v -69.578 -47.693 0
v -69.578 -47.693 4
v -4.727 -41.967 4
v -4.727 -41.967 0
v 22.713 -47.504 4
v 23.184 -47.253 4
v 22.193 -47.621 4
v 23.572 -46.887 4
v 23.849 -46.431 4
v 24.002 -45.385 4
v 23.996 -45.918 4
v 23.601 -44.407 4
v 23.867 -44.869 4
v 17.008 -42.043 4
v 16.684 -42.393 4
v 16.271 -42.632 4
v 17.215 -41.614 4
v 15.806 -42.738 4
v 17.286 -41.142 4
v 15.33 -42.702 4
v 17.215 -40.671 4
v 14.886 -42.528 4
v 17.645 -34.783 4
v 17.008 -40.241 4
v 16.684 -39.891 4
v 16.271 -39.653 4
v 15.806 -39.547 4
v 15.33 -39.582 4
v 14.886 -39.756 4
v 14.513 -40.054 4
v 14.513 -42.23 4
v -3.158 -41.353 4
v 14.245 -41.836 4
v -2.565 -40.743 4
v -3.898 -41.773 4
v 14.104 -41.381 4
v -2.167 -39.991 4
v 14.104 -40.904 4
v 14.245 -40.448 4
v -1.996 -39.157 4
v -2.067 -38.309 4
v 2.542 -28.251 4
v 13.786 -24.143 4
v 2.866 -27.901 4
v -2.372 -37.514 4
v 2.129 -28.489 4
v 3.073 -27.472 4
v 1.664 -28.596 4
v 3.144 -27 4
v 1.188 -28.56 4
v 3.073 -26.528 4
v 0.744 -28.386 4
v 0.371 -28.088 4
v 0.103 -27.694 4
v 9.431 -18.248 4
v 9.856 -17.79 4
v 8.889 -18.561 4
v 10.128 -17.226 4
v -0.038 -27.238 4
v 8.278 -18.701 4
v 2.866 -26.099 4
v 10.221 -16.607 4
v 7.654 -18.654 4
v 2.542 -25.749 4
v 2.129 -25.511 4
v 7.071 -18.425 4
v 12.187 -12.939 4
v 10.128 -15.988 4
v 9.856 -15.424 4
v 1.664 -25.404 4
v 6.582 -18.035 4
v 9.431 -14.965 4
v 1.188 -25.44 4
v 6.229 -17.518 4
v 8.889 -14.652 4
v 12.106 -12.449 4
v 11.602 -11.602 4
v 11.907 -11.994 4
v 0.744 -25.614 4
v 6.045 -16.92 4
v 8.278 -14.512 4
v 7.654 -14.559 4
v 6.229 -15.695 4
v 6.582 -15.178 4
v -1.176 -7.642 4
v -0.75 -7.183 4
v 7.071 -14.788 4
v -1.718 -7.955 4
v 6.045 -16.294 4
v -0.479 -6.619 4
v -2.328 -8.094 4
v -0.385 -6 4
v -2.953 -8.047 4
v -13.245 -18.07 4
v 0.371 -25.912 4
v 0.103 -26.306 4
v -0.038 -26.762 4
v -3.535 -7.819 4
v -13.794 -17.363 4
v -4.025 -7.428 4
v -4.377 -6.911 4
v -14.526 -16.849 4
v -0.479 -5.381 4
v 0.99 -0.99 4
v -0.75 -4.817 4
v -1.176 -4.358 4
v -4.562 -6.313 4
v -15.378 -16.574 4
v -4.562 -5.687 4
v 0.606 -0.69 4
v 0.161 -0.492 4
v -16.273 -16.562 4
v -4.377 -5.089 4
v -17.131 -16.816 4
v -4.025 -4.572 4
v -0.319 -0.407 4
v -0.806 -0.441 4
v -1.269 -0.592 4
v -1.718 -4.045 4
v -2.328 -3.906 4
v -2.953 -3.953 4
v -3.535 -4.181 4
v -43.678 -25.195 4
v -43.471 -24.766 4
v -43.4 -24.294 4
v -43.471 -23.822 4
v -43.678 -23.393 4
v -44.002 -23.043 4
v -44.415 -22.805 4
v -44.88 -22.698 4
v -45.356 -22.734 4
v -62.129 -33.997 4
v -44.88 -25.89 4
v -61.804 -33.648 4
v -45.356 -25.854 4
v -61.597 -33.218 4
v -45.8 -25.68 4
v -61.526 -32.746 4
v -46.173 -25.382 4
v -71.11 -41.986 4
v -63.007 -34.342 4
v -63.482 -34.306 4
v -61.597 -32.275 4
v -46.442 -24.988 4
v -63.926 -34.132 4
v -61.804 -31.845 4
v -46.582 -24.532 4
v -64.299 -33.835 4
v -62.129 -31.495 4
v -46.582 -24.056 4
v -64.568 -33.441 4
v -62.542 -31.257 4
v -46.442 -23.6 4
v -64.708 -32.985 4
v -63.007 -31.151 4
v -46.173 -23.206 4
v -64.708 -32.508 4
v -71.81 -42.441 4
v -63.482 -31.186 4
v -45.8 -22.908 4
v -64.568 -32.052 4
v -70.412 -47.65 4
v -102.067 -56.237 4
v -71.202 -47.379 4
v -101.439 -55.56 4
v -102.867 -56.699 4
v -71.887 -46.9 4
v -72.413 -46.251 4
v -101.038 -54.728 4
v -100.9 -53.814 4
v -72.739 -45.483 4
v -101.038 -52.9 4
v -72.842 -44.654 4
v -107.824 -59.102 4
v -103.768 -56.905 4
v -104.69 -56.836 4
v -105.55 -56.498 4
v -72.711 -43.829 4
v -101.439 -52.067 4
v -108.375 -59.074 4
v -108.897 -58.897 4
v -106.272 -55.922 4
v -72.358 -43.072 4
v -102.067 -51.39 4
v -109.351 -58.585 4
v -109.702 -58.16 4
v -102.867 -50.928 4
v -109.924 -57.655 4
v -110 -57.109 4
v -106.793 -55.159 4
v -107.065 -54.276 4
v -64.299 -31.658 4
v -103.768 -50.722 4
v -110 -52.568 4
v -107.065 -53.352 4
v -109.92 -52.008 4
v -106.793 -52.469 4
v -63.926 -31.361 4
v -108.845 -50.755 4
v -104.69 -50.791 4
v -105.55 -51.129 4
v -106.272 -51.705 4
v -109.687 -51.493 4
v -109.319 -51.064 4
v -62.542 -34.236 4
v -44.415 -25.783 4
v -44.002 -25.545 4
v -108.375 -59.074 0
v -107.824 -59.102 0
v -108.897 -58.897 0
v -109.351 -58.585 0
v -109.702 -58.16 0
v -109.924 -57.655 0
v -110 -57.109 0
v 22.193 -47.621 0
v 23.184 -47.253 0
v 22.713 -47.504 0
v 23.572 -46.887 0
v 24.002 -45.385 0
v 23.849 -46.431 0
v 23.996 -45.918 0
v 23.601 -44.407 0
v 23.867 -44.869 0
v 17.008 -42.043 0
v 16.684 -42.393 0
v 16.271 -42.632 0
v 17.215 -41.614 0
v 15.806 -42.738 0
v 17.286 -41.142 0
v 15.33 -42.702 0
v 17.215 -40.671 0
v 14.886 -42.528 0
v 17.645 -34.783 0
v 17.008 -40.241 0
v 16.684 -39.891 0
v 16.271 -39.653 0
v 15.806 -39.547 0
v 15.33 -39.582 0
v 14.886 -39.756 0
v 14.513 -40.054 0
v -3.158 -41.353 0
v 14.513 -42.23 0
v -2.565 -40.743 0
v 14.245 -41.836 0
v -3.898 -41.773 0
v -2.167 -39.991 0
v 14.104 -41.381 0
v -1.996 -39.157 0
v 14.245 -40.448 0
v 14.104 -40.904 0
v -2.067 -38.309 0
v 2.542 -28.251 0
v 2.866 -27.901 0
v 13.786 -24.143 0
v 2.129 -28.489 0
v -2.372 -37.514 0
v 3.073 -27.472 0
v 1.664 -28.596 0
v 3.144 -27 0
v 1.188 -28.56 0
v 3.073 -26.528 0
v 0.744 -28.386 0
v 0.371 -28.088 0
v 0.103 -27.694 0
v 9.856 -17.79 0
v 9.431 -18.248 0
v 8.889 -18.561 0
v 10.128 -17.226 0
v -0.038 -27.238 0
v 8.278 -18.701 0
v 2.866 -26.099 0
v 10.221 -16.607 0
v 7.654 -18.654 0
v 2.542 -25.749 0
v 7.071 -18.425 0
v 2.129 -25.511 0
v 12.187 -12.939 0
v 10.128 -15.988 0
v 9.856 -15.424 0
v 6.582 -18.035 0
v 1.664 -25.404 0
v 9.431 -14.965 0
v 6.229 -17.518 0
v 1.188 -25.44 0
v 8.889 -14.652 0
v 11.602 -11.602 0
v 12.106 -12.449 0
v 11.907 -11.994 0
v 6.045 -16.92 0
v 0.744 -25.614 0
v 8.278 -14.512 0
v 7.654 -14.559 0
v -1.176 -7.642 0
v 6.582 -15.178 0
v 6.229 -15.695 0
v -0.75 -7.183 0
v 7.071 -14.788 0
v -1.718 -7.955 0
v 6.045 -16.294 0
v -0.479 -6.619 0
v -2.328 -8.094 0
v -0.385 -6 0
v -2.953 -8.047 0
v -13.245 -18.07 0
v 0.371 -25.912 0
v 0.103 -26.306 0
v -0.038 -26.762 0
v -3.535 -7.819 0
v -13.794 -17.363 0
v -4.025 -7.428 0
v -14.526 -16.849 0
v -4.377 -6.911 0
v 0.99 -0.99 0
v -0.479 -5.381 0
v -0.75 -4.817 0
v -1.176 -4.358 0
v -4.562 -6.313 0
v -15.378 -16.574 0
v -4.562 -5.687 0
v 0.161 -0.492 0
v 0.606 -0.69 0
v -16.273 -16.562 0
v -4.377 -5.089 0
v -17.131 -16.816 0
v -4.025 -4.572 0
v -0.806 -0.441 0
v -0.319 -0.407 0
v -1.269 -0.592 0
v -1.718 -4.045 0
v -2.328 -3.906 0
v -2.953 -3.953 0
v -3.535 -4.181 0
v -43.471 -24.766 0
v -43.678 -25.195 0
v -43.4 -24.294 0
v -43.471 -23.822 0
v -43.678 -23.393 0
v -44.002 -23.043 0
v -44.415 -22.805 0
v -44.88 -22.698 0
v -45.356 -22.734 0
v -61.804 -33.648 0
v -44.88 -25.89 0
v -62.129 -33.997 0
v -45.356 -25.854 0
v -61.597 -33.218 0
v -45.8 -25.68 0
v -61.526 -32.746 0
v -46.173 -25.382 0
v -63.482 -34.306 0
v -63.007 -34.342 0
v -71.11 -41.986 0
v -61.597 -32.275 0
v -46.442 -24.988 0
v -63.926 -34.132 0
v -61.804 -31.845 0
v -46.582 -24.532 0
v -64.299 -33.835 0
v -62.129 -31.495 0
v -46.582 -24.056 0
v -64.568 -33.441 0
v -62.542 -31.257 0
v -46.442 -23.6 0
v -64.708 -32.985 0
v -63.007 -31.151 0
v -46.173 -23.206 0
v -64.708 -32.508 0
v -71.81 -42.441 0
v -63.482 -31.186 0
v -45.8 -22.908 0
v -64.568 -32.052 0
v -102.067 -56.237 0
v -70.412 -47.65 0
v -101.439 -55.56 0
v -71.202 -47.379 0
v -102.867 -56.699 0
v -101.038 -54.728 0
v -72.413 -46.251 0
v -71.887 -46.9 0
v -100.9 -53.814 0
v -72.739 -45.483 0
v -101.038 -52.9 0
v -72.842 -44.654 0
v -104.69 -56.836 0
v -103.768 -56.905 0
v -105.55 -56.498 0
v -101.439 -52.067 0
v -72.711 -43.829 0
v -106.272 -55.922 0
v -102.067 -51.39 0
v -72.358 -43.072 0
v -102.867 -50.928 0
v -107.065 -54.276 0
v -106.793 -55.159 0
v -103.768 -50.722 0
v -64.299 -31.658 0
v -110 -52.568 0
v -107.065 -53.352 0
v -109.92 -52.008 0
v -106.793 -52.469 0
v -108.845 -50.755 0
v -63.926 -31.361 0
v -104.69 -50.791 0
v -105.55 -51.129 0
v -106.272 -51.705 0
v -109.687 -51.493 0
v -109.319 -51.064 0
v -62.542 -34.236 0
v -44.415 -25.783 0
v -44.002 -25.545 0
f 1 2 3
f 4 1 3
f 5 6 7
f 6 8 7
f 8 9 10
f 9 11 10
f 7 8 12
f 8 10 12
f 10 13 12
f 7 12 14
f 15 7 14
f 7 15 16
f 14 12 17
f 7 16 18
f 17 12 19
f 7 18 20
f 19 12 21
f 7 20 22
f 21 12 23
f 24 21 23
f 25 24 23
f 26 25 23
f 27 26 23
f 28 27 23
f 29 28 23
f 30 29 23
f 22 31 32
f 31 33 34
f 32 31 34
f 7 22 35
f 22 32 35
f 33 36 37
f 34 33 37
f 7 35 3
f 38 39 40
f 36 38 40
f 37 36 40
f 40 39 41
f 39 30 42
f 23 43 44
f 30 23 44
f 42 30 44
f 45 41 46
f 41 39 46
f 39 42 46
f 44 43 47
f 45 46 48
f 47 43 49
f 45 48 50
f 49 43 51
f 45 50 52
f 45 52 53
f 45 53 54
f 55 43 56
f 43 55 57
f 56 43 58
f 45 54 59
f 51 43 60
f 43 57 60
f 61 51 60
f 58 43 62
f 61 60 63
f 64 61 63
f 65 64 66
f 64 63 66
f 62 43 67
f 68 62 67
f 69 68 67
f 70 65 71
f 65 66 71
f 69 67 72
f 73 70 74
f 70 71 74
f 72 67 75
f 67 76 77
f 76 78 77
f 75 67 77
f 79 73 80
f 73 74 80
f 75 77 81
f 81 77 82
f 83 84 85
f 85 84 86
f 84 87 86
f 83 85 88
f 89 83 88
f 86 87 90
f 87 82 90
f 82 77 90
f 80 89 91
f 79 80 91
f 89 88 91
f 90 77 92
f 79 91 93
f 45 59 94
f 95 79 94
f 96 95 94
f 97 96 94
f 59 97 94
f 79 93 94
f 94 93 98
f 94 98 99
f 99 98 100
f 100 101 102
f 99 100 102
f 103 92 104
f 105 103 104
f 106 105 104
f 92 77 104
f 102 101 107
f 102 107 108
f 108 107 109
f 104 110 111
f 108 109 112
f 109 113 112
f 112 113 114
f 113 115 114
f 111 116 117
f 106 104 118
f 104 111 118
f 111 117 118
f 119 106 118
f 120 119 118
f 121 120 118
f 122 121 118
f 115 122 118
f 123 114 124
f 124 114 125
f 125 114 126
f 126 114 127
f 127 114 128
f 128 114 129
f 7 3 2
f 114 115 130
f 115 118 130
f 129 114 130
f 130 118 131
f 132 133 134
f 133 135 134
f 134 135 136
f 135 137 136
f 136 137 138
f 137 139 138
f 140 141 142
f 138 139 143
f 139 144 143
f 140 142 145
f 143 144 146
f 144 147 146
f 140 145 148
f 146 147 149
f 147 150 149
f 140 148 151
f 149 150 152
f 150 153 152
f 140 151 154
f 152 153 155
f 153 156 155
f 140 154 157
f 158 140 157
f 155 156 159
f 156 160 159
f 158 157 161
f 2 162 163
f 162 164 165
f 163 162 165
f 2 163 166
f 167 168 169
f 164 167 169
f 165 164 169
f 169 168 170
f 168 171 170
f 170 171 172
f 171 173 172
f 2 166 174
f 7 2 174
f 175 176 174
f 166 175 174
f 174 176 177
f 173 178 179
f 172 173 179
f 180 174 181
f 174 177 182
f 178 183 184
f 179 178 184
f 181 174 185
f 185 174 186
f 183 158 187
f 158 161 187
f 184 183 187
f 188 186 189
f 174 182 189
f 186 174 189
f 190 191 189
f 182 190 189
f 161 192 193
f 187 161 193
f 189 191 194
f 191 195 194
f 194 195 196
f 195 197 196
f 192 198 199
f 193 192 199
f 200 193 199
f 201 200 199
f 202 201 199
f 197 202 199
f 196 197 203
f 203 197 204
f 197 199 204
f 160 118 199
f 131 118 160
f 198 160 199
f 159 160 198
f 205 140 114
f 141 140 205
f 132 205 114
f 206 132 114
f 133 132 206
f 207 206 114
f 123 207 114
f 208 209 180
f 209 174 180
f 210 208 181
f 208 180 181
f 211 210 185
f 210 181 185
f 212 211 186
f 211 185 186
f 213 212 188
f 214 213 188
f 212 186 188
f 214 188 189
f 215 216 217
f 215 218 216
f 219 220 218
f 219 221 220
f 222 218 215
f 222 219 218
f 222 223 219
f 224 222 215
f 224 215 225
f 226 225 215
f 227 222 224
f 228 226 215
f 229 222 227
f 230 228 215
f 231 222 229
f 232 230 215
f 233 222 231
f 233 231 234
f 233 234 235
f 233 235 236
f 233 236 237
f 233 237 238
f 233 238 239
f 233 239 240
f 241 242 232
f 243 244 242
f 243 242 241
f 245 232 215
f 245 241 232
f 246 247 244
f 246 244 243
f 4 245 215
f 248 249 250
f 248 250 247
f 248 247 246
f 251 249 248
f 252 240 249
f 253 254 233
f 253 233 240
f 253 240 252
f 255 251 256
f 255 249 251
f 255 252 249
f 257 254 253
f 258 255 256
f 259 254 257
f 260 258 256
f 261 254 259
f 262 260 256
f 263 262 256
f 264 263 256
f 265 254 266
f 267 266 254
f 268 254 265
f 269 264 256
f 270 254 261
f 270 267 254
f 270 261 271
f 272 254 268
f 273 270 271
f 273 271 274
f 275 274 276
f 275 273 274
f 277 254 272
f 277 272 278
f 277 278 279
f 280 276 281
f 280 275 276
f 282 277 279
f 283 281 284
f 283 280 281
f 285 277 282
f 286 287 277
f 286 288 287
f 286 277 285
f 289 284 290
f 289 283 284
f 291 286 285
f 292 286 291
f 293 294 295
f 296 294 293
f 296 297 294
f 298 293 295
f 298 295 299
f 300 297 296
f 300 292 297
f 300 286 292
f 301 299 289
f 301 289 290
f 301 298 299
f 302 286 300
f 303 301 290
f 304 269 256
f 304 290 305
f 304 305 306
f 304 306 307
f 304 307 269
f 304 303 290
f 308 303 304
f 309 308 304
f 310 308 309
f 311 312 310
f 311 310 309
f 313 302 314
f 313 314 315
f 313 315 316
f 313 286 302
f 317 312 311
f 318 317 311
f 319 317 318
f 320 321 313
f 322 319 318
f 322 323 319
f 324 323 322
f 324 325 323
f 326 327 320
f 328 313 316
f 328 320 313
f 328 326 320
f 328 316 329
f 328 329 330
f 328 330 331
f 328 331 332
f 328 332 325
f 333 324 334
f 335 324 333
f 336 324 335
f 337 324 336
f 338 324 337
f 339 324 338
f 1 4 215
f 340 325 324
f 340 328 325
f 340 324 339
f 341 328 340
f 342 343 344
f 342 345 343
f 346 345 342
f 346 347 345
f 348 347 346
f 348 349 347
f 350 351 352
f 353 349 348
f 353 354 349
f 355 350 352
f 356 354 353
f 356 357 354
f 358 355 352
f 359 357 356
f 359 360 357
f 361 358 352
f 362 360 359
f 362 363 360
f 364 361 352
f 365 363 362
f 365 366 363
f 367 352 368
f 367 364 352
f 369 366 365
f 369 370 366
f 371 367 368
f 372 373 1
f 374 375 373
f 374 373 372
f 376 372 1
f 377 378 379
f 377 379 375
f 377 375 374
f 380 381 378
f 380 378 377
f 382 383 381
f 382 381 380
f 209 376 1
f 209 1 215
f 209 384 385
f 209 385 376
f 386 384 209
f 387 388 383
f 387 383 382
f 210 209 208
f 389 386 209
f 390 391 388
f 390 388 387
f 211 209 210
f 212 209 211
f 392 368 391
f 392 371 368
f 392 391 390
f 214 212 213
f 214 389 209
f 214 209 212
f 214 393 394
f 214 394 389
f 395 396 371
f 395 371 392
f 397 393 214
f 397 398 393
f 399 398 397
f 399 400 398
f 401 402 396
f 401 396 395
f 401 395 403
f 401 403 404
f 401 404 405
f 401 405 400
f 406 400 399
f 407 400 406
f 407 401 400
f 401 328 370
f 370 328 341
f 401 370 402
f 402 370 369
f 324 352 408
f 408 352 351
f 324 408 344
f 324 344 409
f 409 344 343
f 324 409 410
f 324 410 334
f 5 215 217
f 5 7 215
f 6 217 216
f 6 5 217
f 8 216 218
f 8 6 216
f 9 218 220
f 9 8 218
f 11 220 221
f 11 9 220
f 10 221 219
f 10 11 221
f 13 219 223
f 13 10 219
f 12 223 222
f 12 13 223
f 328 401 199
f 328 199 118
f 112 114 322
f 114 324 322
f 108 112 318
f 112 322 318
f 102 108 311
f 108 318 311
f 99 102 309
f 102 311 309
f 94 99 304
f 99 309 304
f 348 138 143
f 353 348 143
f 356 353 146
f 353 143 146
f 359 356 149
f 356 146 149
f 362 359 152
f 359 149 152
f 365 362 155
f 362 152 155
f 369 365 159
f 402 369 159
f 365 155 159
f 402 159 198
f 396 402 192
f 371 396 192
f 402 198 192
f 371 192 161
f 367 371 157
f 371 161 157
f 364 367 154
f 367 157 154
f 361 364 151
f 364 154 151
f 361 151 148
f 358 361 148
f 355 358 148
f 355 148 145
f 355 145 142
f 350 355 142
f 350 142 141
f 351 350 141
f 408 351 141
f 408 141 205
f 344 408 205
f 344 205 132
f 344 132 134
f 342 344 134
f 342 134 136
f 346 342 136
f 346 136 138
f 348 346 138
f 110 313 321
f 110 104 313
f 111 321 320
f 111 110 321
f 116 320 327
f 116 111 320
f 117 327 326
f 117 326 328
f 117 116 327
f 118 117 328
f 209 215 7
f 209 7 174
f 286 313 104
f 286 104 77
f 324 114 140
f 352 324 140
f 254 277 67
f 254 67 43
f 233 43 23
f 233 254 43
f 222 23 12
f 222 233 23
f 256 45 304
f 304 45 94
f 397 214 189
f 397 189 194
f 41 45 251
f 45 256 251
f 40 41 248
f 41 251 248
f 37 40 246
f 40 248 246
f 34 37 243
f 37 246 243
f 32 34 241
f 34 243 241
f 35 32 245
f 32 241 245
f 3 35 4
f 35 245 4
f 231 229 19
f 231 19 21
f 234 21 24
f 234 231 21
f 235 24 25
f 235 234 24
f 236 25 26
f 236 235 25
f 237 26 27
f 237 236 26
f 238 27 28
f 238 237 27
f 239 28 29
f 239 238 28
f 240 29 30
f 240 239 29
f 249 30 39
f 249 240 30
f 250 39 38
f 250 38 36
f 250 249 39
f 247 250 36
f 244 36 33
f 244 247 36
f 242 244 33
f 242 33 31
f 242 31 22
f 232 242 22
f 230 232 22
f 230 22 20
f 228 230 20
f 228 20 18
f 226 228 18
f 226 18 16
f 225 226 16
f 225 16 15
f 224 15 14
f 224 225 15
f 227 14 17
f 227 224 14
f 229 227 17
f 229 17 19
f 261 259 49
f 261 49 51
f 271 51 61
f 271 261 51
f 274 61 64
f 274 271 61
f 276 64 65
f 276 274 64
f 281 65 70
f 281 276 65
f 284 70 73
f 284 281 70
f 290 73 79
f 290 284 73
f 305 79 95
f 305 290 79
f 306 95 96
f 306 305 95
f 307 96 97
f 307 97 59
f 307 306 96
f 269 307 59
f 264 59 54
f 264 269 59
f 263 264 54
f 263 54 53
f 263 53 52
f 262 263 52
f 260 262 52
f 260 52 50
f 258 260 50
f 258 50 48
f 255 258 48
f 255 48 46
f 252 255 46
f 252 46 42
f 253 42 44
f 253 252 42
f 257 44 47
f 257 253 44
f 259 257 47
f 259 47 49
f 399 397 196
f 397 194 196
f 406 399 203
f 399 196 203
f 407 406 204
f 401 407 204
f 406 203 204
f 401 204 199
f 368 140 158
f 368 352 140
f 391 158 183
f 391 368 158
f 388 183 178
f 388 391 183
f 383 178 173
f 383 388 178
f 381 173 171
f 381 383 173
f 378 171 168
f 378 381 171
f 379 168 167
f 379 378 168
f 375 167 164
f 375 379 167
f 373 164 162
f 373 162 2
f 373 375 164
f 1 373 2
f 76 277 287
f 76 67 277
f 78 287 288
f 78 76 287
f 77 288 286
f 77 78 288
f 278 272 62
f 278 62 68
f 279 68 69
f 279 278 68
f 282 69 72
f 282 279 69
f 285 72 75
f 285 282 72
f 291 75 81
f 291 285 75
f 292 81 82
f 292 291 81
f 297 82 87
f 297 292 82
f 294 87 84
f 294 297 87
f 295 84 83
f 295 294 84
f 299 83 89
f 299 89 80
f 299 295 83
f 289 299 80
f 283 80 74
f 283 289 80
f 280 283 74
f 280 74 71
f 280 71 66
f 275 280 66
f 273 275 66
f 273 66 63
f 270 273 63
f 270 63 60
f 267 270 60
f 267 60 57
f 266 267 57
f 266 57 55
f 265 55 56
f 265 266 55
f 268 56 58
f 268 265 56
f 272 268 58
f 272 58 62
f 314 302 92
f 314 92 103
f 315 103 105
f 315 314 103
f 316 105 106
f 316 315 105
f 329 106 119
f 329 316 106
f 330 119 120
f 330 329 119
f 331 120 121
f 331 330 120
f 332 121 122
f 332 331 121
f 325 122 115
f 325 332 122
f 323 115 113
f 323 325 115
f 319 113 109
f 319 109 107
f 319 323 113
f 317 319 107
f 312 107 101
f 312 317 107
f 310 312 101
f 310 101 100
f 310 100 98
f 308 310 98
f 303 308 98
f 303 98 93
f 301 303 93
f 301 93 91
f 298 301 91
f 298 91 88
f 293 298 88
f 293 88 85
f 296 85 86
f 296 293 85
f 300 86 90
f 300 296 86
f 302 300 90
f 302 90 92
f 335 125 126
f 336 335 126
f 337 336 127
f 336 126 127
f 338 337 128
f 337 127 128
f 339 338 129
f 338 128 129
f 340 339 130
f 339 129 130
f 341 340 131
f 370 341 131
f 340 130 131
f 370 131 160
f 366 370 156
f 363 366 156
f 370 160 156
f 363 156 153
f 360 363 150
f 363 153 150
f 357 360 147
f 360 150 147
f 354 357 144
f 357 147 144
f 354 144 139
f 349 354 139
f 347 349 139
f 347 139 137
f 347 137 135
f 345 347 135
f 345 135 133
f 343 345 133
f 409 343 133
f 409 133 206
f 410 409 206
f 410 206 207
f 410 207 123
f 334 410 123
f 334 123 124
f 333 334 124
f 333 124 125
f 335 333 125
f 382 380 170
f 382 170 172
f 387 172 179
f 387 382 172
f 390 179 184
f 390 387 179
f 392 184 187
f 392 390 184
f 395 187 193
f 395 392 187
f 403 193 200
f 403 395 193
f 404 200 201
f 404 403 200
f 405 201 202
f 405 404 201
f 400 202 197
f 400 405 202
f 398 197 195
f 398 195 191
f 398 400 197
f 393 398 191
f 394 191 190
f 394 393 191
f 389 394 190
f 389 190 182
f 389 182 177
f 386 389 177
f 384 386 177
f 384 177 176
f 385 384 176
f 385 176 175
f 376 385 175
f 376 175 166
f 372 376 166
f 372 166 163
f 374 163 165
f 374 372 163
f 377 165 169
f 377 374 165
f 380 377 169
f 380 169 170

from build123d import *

# Parameters (mm, degrees)
SKETCH_1_R          = 3.1
SKETCH_1_R_2        = 2.1
SKETCH_1_R_3        = 1.6
EXTRUDE_1_DEPTH     = 4
FILLET_2_R          = 2
SKETCH_2_R          = 1.6
CUT_EXTRUDE_1_DEPTH = 20
CUT_EXTRUDE_2_DEPTH = 10
FILLET_3_R          = 3


with BuildPart() as part:
    # 草图1 → 凸台-拉伸1 (new body)
    with BuildSketch(Plane.XY):
        with BuildLine():
            Line((25.982574674, -47.286360788), (-110, -59.293842397))
            Line((-110, -59.293842397), (-110, -51.293842397))
            Line((-110, -51.293842397), (0, 0))
            Line((0, 0), (12.161955086, -12.161955086))
            ThreePointArc((12.161955086, -12.161955086), (15.964760057, -30.946887294), (25.982574674, -47.286360788))
        make_face()
        with Locations((-104, -53.81375969)):
            Circle(SKETCH_1_R, mode=Mode.SUBTRACT)
        with Locations((-2.485281374, -6)):
            Circle(SKETCH_1_R_2, mode=Mode.SUBTRACT)
        with Locations((8.121320344, -16.606601718)):
            Circle(SKETCH_1_R_2, mode=Mode.SUBTRACT)
        with Locations((1.544155877, -27)):
            Circle(SKETCH_1_R_3, mode=Mode.SUBTRACT)
        with Locations((15.686291501, -41.142135624)):
            Circle(SKETCH_1_R_3, mode=Mode.SUBTRACT)
    extrude(amount=EXTRUDE_1_DEPTH)

    # 圆角2
    fillet_2_edges = [part.edges().sort_by_distance(p)[0] for p in [
        (12.161955086, -12.161955086, 2),
        (25.982574674, -47.286360788, 2),
        (-110, -59.293842397, 2),
        (-110, -51.293842397, 2),
        (0, 0, 2),
    ]]
    fillet(fillet_2_edges, radius=FILLET_2_R)

    # 草图2 → 切除-拉伸1 (cut)
    with BuildSketch(Plane.XY.offset(4)):
        with Locations((-45, -24.293978374)):
            Circle(SKETCH_2_R)
        with Locations((-63.126155741, -32.746343609)):
            Circle(SKETCH_2_R)
    extrude(amount=-CUT_EXTRUDE_1_DEPTH, mode=Mode.SUBTRACT)

    # 草图3 → 切除-拉伸2 (cut)
    with BuildSketch(Plane.XY.offset(4)):
        Polygon((-14.605360146, -15.637614638), (-86.566111127, -49.193463907), (-0.110692732, -41.559310422), align=None)
    extrude(amount=-CUT_EXTRUDE_2_DEPTH, mode=Mode.SUBTRACT)

    # 圆角3
    fillet_3_edges = [part.edges().sort_by_distance(p)[0] for p in [
        (-14.605360146, -15.637614638, 2),
        (-0.110692732, -41.559310422, 2),
        (-86.566111127, -49.193463907, 2),
    ]]
    fillet(fillet_3_edges, radius=FILLET_3_R)


solid = part.part
